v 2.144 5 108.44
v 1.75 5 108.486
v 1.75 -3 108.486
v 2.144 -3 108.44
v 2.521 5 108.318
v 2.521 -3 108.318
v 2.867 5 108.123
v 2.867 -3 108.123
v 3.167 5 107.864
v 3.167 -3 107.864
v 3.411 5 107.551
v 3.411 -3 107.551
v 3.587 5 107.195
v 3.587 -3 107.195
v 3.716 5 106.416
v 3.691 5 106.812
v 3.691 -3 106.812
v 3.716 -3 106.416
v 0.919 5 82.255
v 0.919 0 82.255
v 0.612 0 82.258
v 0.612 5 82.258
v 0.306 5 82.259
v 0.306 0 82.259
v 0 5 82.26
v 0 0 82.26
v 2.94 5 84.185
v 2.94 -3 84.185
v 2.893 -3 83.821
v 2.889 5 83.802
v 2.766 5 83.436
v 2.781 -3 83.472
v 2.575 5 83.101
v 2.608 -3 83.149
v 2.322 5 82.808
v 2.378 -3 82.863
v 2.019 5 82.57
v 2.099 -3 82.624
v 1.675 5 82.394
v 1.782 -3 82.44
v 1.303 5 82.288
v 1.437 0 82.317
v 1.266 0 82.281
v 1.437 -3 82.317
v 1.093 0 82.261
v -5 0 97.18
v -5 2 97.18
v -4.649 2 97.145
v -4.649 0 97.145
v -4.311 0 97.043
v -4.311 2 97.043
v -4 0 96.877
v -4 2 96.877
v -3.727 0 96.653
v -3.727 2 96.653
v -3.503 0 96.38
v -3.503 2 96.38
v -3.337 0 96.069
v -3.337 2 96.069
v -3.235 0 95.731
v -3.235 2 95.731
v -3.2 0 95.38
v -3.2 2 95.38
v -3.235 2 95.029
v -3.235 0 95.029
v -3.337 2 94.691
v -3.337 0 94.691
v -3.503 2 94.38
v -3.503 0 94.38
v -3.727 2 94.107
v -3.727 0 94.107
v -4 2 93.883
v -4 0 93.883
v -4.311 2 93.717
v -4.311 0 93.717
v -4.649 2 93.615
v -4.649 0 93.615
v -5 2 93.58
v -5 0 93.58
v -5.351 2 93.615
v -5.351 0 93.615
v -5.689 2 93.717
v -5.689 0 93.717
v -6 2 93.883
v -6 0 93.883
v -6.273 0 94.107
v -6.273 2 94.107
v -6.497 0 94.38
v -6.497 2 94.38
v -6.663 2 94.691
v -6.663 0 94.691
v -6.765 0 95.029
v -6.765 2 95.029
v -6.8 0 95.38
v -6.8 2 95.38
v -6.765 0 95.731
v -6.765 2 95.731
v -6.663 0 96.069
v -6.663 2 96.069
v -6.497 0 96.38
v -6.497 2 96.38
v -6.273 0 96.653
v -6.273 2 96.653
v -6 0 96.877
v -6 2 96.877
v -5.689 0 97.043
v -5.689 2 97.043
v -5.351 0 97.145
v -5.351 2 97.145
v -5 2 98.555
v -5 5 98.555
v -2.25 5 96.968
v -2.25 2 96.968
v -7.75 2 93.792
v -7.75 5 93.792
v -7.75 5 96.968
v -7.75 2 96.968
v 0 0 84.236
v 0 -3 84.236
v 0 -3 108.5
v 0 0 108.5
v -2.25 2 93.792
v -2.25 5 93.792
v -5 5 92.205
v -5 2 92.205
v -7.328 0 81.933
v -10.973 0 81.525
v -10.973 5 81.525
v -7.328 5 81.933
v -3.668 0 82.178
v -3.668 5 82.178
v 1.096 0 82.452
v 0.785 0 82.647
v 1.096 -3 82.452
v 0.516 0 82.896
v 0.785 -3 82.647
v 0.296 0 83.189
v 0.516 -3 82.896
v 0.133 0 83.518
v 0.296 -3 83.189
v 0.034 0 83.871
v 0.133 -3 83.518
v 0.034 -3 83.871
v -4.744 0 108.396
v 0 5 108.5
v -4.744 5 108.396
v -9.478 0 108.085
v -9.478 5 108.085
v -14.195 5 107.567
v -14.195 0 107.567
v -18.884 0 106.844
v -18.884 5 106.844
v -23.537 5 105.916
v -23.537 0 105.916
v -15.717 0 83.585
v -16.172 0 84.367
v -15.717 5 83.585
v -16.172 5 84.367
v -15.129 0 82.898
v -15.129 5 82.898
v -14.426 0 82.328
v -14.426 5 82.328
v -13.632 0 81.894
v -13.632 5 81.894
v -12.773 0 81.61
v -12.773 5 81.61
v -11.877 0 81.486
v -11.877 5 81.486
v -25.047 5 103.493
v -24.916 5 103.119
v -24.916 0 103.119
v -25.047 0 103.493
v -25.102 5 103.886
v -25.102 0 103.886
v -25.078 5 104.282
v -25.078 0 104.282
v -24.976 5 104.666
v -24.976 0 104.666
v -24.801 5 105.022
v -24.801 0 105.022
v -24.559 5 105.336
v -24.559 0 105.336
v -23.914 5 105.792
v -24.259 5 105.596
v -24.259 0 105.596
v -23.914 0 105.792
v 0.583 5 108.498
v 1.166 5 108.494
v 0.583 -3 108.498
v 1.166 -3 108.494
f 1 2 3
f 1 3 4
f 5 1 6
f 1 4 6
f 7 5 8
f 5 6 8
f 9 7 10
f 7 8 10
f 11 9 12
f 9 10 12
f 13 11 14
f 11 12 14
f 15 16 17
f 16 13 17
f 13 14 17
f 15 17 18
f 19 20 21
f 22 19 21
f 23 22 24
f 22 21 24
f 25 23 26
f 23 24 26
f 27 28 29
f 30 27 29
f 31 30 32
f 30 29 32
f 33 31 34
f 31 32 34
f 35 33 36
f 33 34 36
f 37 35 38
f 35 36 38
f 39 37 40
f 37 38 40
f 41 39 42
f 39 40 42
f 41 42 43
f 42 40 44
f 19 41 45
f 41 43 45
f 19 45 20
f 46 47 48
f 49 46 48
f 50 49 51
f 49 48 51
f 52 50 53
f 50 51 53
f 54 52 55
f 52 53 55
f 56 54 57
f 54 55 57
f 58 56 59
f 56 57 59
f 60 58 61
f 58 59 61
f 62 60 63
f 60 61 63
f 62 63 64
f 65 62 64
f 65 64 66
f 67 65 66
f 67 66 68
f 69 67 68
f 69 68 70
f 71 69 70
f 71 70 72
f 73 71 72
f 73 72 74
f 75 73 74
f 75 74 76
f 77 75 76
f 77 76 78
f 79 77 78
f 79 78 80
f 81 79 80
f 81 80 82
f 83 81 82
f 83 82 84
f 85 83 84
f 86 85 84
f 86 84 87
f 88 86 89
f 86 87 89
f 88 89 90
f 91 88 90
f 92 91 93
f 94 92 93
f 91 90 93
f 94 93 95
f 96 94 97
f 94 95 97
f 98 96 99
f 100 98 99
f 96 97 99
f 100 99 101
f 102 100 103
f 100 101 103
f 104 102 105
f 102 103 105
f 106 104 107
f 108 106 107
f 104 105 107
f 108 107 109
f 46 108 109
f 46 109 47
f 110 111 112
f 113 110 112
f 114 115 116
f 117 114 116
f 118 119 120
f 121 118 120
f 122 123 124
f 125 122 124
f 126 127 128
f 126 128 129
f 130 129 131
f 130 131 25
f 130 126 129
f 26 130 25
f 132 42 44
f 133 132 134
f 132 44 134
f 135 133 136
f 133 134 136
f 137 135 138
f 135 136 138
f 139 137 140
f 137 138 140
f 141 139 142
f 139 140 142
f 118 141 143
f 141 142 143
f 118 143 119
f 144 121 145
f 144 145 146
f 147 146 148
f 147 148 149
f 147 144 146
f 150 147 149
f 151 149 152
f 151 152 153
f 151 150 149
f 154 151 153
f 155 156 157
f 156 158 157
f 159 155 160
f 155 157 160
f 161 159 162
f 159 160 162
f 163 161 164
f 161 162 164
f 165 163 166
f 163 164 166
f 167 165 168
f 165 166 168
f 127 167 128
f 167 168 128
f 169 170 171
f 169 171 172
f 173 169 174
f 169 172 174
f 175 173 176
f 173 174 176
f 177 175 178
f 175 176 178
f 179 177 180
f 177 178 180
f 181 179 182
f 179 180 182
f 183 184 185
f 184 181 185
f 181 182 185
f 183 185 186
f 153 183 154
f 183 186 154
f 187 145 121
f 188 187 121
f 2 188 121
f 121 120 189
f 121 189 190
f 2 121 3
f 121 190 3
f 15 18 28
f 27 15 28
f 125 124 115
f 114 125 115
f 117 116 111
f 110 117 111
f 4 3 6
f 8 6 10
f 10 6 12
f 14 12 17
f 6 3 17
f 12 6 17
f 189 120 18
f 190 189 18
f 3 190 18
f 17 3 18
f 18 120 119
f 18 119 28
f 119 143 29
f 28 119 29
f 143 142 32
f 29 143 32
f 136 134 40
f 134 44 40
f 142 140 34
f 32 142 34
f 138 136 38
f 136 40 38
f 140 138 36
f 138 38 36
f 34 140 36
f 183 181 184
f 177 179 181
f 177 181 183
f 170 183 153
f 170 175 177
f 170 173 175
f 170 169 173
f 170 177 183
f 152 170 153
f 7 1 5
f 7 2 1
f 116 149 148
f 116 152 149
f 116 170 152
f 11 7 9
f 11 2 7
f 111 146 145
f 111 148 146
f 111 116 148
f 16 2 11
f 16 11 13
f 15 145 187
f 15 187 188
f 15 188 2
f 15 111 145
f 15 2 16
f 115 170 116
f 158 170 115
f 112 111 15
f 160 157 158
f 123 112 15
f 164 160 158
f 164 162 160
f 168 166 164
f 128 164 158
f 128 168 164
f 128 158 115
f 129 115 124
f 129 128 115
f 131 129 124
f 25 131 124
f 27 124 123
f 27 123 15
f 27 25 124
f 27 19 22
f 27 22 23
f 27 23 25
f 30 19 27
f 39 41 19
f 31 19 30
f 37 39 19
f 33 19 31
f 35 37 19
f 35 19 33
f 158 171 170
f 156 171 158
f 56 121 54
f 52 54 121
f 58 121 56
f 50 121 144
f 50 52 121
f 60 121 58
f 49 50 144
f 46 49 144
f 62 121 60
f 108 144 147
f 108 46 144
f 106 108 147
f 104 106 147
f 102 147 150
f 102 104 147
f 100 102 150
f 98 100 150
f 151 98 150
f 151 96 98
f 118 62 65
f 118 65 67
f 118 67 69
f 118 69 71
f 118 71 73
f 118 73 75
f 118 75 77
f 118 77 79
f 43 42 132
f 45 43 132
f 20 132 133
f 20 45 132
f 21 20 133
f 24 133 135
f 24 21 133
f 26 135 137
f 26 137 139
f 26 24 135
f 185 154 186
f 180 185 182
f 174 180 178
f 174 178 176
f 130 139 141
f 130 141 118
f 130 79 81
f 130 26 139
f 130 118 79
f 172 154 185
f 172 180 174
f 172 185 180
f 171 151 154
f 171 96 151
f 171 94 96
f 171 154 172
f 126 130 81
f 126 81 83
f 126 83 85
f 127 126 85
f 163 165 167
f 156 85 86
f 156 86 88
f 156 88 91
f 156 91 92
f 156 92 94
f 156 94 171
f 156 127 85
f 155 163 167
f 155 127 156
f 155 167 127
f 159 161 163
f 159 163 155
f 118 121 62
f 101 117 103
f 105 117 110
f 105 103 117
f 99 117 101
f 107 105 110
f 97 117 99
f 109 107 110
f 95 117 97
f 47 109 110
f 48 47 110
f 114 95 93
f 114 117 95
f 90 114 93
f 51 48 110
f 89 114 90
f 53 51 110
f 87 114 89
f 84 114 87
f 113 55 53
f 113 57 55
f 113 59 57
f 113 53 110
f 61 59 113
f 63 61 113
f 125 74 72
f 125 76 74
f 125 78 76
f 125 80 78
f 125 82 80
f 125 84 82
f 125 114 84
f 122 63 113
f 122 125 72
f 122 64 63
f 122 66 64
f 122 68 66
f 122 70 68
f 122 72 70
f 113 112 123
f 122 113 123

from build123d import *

# Parameters (mm, degrees)
RESSALTO_EXTRUS_O4_DEPTH = 5
ESBO_O8_R                = 1.8
CORTE_EXTRUS_O3_DEPTH    = 112.673524207
RESSALTO_EXTRUS_O5_START = -8
RESSALTO_EXTRUS_O5_DEPTH = 8
CORTE_EXTRUS_O4_DEPTH    = 3
FILETE1_R                = 5
FILETE2_R                = 2


with BuildPart() as part:
    # Esboço6 → Ressalto-extrusão4 (new body)
    with BuildSketch(Plane(origin=(0, 0, 0), x_dir=(1, 0, 0), z_dir=(0, 1, 0))):
        with BuildLine():
            Line((0, -82.26), (0, -108.5))
            ThreePointArc((0, -108.5), (-13.073364664, -107.709503464), (-25.956232563, -105.349532468))
            Line((-25.956232563, -105.349532468), (-14.581921132, -80.957242888))
            ThreePointArc((-14.581921132, -80.957242888), (-7.32, -81.933663411), (0, -82.26))
        make_face()
    extrude(amount=RESSALTO_EXTRUS_O4_DEPTH)

    # Esboço8 → Corte-extrusão3 (cut, through all)
    with BuildSketch(Plane(origin=(0, 5, 0), x_dir=(1, 0, 0), z_dir=(0, 1, 0))):
        with Locations(Location((-5, -95.38, 0), (0, 0, 270))):
            Circle(ESBO_O8_R)
    extrude(amount=-CORTE_EXTRUS_O3_DEPTH, mode=Mode.SUBTRACT)

    # Esboço7 → Ressalto-extrusão5 (add)
    with BuildSketch(Plane(origin=(0, 5, 0), x_dir=(1, 0, 0), z_dir=(0, 1, 0)).offset(RESSALTO_EXTRUS_O5_START)):
        with BuildLine():
            ThreePointArc((0, -108.5), (1.893586098, -108.483474924), (3.786595392, -108.433904732))
            Line((3.786595392, -108.433904732), (2.870832599, -82.209889431))
            ThreePointArc((2.870832599, -82.209889431), (1.435634954, -82.247471404), (0, -82.26))
            Line((0, -82.26), (0, -108.5))
        make_face()
    extrude(amount=RESSALTO_EXTRUS_O5_DEPTH)

    # Esboço9 → Corte-extrusão4 (cut)
    with BuildSketch(Plane(origin=(0, 5, 0), x_dir=(1, 0, 0), z_dir=(0, 1, 0))):
        Polygon((-7.75, -93.79228676), (-7.75, -96.96771324), (-5, -98.555426481), (-2.25, -96.96771324), (-2.25, -93.79228676), (-5, -92.204573519), align=None)
    extrude(amount=-CORTE_EXTRUS_O4_DEPTH, mode=Mode.SUBTRACT)

    # Filete1
    filete1_edges = [part.edges().sort_by_distance(p)[0] for p in [
        (-14.581921132, 2.5, 80.957242888),
    ]]
    fillet(filete1_edges, radius=FILETE1_R)

    # Filete2
    # the kernel refuses this fillet: 2 mm, written as the material it takes off along each edge
    with BuildSketch(Plane(origin=(-25.956232563, -6.211327666, 105.349532468), x_dir=(0.42261826174069944, 0, -0.9063077870366499), z_dir=(0, 1, 0))) as filete2_piece_1:
        with BuildLine():
            CenterArc((2.461525654, -2), FILETE2_R, 90, 102.471061381)
            ThreePointArc((0.508715252, -2.431892969), (0.247396438, -1.21740266), (0, 0))
            Line((0, 0), (2.461525654, 0))
        make_face()
    extrude(amount=17.422655332, mode=Mode.SUBTRACT)
    with BuildSketch(Plane(origin=(2.870832599, -7.940651502, 82.209889431), x_dir=(-0.9997346498502194, 0, 0.023035405116018468), z_dir=(0, 1, 0))) as filete2_piece_2:
        with BuildLine():
            CenterArc((1.976403158, 1.999859125), FILETE2_R, 180.680051756, 88.639896488)
            Line((-0.023455967, 1.976121398), (0, 0))
            ThreePointArc((0, 0), (0.976332715, 0.005794184), (1.952665431, 0))
        make_face()
    extrude(amount=17.881303004, mode=Mode.SUBTRACT)
    with BuildSketch(Plane(origin=(3.786595392, -8.094121302, 108.433904732), x_dir=(-0.034899496702502156, 0, -0.9993908270190958), z_dir=(0, 1, 0))) as filete2_piece_3:
        with BuildLine():
            CenterArc((2.018780999, 2), FILETE2_R, 178.923959667, 91.076040333)
            ThreePointArc((0.019133694, 2.037558685), (0.004783529, 1.01882426), (0, 0))
            Line((0, 0), (2.018780999, 0))
        make_face()
    extrude(amount=18.188242605, mode=Mode.SUBTRACT)
    with BuildSketch(Plane(origin=(0, -7.940651502, 82.26), x_dir=(0.9999295625583442, 0, -0.011868863546203106), z_dir=(0, 1, 0))) as filete2_piece_4:
        with BuildLine():
            CenterArc((1.976403158, -1.999859125), FILETE2_R, 90.680051756, 88.639896488)
            Line((-0.023455967, -1.976121398), (0, 0))
            ThreePointArc((0, 0), (0.976332715, -0.005794184), (1.952665431, 0))
        make_face()
    extrude(amount=7.940651502, mode=Mode.SUBTRACT)


solid = part.part
